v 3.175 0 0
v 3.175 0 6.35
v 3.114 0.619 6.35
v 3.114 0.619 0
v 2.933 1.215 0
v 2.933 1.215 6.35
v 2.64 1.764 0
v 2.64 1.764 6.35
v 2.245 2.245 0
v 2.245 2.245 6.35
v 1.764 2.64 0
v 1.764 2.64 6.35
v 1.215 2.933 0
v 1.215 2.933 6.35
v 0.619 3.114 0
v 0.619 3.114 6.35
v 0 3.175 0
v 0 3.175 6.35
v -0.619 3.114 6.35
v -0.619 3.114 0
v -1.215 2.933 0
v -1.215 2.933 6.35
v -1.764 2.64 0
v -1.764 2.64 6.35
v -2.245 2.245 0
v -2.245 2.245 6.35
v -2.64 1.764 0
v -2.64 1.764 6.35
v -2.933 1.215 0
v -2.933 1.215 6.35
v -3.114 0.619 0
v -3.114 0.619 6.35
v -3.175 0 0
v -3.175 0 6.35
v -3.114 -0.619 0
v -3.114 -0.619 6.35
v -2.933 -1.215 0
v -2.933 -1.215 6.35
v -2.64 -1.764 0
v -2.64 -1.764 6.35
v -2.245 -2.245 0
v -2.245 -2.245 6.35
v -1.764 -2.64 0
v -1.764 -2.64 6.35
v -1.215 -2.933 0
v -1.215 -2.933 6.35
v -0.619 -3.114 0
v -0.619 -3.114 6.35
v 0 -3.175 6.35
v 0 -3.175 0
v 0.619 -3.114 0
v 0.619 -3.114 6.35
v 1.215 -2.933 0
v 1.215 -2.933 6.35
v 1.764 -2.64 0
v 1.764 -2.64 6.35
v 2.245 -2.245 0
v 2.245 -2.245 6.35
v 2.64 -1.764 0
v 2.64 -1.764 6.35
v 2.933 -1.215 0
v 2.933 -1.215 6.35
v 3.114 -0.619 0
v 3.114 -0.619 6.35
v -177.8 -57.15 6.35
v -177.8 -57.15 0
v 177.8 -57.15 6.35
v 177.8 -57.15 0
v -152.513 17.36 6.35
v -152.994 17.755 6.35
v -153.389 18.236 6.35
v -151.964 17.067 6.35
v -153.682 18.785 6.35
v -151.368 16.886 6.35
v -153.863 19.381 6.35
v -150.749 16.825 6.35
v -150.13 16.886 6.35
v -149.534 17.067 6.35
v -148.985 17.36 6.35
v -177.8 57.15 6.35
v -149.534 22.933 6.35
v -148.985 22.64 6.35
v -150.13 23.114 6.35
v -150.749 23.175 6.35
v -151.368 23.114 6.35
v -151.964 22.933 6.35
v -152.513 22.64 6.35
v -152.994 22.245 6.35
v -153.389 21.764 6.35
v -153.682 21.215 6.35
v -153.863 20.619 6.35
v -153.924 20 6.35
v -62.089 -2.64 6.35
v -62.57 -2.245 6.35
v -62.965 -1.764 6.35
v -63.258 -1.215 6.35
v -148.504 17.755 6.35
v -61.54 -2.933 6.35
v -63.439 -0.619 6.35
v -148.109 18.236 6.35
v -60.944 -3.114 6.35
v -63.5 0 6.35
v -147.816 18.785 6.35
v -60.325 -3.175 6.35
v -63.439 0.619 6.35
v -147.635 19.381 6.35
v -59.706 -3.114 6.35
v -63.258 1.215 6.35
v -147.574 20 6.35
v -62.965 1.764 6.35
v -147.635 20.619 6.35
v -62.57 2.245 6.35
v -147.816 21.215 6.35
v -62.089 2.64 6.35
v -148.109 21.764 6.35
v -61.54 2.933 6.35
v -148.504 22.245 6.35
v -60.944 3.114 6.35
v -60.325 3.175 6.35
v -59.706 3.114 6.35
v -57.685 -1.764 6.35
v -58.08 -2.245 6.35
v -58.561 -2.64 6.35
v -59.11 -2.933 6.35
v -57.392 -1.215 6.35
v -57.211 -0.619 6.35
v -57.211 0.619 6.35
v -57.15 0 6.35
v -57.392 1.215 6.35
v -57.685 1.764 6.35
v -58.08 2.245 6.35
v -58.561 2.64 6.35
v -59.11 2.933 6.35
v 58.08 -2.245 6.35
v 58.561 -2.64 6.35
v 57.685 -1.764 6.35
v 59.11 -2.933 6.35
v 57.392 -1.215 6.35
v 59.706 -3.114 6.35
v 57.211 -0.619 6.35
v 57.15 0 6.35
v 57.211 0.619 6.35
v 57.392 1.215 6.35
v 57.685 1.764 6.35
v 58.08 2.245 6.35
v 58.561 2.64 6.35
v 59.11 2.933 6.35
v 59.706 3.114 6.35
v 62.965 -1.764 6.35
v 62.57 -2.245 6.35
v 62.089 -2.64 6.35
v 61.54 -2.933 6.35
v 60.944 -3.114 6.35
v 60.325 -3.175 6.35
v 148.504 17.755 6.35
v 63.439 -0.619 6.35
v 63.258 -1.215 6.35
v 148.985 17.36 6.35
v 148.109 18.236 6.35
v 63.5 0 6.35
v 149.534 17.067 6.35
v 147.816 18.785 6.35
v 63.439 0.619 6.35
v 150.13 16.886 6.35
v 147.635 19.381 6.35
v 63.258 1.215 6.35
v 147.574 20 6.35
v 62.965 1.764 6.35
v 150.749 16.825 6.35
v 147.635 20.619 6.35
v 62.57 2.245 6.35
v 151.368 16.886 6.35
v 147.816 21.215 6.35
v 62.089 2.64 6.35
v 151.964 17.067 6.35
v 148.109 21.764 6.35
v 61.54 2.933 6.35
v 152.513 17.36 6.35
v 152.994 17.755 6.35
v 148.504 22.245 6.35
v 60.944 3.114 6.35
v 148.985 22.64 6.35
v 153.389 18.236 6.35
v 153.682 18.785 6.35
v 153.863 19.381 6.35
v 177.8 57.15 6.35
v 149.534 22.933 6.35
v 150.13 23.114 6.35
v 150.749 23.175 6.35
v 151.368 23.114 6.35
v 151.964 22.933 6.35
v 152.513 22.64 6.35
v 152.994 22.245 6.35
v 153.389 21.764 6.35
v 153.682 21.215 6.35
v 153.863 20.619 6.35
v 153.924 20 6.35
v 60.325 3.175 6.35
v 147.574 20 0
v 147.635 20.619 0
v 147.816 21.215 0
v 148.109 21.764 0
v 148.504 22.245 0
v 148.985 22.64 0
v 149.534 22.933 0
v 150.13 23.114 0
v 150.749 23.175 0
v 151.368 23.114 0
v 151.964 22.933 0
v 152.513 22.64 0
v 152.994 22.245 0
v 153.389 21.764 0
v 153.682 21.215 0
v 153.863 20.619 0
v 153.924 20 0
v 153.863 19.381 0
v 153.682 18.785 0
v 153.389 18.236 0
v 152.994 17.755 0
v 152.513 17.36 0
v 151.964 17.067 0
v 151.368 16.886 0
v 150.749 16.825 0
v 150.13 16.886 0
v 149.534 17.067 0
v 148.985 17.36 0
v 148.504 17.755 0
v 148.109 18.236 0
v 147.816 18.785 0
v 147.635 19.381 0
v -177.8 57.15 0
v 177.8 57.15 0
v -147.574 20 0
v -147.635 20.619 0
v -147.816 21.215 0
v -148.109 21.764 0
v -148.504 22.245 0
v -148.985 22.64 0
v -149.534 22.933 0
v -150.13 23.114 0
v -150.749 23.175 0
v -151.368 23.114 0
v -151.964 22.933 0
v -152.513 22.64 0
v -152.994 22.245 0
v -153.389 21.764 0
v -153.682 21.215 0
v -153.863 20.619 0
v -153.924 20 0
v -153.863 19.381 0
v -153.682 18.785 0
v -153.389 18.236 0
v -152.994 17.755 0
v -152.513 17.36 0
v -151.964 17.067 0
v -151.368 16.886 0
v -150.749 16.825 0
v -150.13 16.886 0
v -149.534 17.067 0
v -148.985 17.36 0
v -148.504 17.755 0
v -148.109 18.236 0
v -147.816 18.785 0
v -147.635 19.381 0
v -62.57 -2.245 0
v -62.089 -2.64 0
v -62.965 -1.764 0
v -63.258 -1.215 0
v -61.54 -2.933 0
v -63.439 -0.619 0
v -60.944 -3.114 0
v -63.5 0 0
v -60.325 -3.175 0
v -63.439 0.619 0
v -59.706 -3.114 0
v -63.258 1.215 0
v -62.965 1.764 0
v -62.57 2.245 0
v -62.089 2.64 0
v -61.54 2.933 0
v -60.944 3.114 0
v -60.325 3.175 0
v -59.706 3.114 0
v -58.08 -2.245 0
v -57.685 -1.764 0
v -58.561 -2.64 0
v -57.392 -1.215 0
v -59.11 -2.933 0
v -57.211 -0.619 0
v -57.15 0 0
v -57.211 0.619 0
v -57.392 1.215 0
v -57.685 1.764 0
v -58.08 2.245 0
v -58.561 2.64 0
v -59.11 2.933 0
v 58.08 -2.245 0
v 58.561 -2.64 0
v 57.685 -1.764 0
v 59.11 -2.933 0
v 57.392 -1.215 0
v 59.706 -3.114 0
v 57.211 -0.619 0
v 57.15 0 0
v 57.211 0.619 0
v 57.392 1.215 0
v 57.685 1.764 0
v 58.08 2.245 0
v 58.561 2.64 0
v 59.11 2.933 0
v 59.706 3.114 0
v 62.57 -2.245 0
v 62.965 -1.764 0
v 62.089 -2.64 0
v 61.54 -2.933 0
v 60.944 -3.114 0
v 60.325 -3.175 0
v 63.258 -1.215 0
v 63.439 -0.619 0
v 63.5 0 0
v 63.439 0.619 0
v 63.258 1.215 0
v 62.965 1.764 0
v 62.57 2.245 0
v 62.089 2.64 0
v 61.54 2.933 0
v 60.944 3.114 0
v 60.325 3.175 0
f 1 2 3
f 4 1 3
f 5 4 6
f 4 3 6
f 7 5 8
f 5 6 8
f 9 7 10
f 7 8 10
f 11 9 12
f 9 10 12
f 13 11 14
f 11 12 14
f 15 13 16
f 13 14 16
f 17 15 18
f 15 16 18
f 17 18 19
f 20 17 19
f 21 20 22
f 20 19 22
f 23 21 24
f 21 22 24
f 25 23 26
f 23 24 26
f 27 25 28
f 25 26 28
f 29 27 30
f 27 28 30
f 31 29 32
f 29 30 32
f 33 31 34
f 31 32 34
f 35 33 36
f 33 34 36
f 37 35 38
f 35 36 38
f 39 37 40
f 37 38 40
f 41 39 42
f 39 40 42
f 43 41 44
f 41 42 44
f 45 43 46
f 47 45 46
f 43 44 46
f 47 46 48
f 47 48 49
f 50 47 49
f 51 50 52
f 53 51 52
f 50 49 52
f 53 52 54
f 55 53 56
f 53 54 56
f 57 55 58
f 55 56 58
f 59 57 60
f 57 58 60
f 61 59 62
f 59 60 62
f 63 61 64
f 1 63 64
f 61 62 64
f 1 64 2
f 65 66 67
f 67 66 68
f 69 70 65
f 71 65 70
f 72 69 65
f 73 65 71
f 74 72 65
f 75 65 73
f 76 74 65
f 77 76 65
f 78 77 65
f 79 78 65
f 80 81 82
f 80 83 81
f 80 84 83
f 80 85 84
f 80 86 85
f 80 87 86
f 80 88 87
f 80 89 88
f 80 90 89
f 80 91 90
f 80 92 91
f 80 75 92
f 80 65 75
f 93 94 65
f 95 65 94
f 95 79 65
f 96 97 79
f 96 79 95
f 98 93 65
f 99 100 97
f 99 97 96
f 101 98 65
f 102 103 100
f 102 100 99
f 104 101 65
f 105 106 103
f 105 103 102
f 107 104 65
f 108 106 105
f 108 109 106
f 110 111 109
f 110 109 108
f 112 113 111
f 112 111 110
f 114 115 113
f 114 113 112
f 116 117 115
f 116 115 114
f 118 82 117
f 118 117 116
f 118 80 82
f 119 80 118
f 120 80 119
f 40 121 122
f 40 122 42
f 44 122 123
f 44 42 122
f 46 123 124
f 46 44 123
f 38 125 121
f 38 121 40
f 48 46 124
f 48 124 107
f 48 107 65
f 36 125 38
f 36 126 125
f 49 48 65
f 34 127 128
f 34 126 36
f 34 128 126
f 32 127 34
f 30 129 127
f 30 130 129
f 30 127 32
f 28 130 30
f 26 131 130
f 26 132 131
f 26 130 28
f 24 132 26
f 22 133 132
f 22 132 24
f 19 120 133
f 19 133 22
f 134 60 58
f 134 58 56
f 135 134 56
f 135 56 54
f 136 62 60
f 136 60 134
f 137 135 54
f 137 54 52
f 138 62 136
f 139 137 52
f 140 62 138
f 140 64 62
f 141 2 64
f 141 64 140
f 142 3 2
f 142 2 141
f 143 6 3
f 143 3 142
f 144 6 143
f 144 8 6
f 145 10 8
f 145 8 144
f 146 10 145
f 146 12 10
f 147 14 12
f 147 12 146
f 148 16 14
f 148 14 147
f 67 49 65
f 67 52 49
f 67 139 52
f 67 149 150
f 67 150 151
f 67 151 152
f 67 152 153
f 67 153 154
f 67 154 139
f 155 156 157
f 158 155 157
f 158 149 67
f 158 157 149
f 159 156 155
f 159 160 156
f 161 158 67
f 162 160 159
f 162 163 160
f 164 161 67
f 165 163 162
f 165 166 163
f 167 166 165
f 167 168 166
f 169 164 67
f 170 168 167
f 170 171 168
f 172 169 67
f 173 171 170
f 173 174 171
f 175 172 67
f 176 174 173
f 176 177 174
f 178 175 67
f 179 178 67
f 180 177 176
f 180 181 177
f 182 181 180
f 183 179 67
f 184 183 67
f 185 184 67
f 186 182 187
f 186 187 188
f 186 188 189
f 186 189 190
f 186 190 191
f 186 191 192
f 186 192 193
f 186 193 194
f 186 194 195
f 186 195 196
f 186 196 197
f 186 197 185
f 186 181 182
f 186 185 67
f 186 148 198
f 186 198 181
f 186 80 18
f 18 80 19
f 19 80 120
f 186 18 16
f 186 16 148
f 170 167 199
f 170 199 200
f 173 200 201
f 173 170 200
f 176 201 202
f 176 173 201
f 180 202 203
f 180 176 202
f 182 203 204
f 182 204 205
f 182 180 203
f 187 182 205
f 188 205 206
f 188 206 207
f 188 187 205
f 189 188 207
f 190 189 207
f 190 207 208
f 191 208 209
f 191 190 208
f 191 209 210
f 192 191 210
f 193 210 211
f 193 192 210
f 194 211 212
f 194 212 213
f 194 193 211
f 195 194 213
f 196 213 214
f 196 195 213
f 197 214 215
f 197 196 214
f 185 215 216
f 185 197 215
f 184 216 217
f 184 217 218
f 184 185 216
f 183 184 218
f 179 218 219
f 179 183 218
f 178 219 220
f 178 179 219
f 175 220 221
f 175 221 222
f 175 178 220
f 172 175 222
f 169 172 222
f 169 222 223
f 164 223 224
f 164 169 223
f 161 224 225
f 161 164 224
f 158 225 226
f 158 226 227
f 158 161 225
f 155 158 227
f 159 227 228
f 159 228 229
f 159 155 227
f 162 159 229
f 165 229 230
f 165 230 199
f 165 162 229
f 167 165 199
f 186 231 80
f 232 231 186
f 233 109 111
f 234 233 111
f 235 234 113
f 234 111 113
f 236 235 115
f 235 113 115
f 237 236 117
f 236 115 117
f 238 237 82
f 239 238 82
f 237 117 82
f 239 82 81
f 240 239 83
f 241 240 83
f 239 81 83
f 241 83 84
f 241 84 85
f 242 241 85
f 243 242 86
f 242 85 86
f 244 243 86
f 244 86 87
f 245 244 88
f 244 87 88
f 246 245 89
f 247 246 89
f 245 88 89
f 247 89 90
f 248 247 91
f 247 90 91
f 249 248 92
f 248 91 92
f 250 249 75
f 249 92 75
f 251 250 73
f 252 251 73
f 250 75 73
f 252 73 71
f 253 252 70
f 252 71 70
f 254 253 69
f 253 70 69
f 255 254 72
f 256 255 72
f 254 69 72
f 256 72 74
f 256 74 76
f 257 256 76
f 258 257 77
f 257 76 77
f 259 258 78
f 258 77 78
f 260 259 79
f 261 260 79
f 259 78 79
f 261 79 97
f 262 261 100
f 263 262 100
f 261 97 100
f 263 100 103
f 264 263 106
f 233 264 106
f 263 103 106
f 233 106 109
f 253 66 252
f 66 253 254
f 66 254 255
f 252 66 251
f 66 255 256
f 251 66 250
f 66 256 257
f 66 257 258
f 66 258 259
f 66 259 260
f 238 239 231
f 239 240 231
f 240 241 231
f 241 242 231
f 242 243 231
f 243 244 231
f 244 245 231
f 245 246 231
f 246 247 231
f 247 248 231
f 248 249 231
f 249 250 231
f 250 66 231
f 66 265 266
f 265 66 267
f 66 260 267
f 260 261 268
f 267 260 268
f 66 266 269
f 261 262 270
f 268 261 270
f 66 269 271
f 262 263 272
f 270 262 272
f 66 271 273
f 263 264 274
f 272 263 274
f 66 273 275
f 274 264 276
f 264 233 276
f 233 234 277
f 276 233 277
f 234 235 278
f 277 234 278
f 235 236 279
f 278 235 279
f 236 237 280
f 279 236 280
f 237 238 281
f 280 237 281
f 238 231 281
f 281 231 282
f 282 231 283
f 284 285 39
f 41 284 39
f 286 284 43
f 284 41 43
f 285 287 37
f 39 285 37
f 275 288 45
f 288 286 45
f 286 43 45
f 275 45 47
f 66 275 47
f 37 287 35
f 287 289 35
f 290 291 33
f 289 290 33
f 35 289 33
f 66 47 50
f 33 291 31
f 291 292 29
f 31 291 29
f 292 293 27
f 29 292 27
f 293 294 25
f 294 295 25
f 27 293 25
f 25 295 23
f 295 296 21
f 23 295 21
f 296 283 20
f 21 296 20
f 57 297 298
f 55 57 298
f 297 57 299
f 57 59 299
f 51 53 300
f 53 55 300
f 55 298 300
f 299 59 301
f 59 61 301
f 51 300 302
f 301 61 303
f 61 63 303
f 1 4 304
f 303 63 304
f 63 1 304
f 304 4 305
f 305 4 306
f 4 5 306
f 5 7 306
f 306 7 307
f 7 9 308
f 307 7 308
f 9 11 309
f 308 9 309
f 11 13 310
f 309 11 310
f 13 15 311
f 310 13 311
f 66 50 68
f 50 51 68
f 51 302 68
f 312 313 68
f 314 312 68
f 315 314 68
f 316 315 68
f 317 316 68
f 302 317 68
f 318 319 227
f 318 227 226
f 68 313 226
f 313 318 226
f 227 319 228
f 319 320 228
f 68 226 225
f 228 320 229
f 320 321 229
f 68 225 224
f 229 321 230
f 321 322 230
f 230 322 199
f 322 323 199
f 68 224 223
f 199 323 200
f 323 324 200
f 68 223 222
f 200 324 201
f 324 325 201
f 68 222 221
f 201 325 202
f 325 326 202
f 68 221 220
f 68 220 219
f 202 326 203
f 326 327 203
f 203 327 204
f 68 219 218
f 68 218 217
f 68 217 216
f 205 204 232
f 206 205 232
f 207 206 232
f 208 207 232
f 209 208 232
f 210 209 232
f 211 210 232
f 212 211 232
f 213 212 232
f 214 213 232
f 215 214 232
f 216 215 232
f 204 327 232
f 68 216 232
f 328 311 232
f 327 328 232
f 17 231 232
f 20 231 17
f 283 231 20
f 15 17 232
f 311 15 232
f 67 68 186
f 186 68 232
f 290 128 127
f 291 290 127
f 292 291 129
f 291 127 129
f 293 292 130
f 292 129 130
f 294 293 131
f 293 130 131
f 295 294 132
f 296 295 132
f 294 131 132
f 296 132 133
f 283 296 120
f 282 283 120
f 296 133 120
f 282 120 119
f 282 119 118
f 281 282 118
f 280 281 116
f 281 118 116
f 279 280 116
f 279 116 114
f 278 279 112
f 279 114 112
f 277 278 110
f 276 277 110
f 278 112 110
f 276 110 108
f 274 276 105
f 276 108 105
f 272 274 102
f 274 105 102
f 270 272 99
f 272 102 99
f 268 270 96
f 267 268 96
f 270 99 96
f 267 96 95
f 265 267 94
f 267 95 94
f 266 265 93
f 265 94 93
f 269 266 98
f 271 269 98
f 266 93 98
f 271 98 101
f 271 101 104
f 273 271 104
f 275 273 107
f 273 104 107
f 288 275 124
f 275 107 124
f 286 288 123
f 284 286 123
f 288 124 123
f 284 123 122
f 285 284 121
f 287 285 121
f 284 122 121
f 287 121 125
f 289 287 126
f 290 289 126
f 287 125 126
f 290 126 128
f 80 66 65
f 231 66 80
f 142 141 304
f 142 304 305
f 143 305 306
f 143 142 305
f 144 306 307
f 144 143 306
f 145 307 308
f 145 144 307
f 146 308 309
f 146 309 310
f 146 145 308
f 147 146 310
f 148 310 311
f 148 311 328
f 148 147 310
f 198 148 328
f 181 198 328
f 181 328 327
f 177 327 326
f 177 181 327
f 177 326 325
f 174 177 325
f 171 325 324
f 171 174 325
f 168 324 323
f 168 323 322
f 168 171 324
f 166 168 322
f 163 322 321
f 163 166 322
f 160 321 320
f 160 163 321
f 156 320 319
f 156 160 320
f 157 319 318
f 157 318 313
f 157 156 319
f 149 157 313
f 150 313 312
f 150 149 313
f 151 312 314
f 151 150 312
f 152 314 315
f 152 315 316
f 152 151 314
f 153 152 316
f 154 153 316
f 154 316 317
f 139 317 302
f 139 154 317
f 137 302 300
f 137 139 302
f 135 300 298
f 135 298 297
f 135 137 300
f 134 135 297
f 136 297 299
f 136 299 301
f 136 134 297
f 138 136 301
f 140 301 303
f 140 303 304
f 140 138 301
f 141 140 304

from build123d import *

# Parameters (mm, degrees)
SKETCH1_W           = 355.6
SKETCH1_H           = 114.3
BOSS_EXTRUDE1_DEPTH = 6.35
SKETCH3_R           = 3.175
CUT_EXTRUDE1_DEPTH  = 6.35


with BuildPart() as part:
    # Sketch1 → Boss-Extrude1 (new body)
    with BuildSketch(Plane.XY):
        Rectangle(SKETCH1_W, SKETCH1_H)
    extrude(amount=BOSS_EXTRUDE1_DEPTH)

    # Sketch3 → Cut-Extrude1 (cut)
    with BuildSketch(Plane.XY.offset(6.35)):
        with Locations((-60.325, 0)):
            Circle(SKETCH3_R)
        Circle(SKETCH3_R)
        with Locations((-150.749, 20)):
            Circle(SKETCH3_R)
    cut_extrude1 = extrude(amount=-CUT_EXTRUDE1_DEPTH, mode=Mode.SUBTRACT)

    # Mirror3: Cut-Extrude1 across plane
    add(cut_extrude1.mirror(Plane(origin=(0, 0, 0), x_dir=(0, 0, 1), z_dir=(1, 0, 0))), mode=Mode.SUBTRACT)


solid = part.part
